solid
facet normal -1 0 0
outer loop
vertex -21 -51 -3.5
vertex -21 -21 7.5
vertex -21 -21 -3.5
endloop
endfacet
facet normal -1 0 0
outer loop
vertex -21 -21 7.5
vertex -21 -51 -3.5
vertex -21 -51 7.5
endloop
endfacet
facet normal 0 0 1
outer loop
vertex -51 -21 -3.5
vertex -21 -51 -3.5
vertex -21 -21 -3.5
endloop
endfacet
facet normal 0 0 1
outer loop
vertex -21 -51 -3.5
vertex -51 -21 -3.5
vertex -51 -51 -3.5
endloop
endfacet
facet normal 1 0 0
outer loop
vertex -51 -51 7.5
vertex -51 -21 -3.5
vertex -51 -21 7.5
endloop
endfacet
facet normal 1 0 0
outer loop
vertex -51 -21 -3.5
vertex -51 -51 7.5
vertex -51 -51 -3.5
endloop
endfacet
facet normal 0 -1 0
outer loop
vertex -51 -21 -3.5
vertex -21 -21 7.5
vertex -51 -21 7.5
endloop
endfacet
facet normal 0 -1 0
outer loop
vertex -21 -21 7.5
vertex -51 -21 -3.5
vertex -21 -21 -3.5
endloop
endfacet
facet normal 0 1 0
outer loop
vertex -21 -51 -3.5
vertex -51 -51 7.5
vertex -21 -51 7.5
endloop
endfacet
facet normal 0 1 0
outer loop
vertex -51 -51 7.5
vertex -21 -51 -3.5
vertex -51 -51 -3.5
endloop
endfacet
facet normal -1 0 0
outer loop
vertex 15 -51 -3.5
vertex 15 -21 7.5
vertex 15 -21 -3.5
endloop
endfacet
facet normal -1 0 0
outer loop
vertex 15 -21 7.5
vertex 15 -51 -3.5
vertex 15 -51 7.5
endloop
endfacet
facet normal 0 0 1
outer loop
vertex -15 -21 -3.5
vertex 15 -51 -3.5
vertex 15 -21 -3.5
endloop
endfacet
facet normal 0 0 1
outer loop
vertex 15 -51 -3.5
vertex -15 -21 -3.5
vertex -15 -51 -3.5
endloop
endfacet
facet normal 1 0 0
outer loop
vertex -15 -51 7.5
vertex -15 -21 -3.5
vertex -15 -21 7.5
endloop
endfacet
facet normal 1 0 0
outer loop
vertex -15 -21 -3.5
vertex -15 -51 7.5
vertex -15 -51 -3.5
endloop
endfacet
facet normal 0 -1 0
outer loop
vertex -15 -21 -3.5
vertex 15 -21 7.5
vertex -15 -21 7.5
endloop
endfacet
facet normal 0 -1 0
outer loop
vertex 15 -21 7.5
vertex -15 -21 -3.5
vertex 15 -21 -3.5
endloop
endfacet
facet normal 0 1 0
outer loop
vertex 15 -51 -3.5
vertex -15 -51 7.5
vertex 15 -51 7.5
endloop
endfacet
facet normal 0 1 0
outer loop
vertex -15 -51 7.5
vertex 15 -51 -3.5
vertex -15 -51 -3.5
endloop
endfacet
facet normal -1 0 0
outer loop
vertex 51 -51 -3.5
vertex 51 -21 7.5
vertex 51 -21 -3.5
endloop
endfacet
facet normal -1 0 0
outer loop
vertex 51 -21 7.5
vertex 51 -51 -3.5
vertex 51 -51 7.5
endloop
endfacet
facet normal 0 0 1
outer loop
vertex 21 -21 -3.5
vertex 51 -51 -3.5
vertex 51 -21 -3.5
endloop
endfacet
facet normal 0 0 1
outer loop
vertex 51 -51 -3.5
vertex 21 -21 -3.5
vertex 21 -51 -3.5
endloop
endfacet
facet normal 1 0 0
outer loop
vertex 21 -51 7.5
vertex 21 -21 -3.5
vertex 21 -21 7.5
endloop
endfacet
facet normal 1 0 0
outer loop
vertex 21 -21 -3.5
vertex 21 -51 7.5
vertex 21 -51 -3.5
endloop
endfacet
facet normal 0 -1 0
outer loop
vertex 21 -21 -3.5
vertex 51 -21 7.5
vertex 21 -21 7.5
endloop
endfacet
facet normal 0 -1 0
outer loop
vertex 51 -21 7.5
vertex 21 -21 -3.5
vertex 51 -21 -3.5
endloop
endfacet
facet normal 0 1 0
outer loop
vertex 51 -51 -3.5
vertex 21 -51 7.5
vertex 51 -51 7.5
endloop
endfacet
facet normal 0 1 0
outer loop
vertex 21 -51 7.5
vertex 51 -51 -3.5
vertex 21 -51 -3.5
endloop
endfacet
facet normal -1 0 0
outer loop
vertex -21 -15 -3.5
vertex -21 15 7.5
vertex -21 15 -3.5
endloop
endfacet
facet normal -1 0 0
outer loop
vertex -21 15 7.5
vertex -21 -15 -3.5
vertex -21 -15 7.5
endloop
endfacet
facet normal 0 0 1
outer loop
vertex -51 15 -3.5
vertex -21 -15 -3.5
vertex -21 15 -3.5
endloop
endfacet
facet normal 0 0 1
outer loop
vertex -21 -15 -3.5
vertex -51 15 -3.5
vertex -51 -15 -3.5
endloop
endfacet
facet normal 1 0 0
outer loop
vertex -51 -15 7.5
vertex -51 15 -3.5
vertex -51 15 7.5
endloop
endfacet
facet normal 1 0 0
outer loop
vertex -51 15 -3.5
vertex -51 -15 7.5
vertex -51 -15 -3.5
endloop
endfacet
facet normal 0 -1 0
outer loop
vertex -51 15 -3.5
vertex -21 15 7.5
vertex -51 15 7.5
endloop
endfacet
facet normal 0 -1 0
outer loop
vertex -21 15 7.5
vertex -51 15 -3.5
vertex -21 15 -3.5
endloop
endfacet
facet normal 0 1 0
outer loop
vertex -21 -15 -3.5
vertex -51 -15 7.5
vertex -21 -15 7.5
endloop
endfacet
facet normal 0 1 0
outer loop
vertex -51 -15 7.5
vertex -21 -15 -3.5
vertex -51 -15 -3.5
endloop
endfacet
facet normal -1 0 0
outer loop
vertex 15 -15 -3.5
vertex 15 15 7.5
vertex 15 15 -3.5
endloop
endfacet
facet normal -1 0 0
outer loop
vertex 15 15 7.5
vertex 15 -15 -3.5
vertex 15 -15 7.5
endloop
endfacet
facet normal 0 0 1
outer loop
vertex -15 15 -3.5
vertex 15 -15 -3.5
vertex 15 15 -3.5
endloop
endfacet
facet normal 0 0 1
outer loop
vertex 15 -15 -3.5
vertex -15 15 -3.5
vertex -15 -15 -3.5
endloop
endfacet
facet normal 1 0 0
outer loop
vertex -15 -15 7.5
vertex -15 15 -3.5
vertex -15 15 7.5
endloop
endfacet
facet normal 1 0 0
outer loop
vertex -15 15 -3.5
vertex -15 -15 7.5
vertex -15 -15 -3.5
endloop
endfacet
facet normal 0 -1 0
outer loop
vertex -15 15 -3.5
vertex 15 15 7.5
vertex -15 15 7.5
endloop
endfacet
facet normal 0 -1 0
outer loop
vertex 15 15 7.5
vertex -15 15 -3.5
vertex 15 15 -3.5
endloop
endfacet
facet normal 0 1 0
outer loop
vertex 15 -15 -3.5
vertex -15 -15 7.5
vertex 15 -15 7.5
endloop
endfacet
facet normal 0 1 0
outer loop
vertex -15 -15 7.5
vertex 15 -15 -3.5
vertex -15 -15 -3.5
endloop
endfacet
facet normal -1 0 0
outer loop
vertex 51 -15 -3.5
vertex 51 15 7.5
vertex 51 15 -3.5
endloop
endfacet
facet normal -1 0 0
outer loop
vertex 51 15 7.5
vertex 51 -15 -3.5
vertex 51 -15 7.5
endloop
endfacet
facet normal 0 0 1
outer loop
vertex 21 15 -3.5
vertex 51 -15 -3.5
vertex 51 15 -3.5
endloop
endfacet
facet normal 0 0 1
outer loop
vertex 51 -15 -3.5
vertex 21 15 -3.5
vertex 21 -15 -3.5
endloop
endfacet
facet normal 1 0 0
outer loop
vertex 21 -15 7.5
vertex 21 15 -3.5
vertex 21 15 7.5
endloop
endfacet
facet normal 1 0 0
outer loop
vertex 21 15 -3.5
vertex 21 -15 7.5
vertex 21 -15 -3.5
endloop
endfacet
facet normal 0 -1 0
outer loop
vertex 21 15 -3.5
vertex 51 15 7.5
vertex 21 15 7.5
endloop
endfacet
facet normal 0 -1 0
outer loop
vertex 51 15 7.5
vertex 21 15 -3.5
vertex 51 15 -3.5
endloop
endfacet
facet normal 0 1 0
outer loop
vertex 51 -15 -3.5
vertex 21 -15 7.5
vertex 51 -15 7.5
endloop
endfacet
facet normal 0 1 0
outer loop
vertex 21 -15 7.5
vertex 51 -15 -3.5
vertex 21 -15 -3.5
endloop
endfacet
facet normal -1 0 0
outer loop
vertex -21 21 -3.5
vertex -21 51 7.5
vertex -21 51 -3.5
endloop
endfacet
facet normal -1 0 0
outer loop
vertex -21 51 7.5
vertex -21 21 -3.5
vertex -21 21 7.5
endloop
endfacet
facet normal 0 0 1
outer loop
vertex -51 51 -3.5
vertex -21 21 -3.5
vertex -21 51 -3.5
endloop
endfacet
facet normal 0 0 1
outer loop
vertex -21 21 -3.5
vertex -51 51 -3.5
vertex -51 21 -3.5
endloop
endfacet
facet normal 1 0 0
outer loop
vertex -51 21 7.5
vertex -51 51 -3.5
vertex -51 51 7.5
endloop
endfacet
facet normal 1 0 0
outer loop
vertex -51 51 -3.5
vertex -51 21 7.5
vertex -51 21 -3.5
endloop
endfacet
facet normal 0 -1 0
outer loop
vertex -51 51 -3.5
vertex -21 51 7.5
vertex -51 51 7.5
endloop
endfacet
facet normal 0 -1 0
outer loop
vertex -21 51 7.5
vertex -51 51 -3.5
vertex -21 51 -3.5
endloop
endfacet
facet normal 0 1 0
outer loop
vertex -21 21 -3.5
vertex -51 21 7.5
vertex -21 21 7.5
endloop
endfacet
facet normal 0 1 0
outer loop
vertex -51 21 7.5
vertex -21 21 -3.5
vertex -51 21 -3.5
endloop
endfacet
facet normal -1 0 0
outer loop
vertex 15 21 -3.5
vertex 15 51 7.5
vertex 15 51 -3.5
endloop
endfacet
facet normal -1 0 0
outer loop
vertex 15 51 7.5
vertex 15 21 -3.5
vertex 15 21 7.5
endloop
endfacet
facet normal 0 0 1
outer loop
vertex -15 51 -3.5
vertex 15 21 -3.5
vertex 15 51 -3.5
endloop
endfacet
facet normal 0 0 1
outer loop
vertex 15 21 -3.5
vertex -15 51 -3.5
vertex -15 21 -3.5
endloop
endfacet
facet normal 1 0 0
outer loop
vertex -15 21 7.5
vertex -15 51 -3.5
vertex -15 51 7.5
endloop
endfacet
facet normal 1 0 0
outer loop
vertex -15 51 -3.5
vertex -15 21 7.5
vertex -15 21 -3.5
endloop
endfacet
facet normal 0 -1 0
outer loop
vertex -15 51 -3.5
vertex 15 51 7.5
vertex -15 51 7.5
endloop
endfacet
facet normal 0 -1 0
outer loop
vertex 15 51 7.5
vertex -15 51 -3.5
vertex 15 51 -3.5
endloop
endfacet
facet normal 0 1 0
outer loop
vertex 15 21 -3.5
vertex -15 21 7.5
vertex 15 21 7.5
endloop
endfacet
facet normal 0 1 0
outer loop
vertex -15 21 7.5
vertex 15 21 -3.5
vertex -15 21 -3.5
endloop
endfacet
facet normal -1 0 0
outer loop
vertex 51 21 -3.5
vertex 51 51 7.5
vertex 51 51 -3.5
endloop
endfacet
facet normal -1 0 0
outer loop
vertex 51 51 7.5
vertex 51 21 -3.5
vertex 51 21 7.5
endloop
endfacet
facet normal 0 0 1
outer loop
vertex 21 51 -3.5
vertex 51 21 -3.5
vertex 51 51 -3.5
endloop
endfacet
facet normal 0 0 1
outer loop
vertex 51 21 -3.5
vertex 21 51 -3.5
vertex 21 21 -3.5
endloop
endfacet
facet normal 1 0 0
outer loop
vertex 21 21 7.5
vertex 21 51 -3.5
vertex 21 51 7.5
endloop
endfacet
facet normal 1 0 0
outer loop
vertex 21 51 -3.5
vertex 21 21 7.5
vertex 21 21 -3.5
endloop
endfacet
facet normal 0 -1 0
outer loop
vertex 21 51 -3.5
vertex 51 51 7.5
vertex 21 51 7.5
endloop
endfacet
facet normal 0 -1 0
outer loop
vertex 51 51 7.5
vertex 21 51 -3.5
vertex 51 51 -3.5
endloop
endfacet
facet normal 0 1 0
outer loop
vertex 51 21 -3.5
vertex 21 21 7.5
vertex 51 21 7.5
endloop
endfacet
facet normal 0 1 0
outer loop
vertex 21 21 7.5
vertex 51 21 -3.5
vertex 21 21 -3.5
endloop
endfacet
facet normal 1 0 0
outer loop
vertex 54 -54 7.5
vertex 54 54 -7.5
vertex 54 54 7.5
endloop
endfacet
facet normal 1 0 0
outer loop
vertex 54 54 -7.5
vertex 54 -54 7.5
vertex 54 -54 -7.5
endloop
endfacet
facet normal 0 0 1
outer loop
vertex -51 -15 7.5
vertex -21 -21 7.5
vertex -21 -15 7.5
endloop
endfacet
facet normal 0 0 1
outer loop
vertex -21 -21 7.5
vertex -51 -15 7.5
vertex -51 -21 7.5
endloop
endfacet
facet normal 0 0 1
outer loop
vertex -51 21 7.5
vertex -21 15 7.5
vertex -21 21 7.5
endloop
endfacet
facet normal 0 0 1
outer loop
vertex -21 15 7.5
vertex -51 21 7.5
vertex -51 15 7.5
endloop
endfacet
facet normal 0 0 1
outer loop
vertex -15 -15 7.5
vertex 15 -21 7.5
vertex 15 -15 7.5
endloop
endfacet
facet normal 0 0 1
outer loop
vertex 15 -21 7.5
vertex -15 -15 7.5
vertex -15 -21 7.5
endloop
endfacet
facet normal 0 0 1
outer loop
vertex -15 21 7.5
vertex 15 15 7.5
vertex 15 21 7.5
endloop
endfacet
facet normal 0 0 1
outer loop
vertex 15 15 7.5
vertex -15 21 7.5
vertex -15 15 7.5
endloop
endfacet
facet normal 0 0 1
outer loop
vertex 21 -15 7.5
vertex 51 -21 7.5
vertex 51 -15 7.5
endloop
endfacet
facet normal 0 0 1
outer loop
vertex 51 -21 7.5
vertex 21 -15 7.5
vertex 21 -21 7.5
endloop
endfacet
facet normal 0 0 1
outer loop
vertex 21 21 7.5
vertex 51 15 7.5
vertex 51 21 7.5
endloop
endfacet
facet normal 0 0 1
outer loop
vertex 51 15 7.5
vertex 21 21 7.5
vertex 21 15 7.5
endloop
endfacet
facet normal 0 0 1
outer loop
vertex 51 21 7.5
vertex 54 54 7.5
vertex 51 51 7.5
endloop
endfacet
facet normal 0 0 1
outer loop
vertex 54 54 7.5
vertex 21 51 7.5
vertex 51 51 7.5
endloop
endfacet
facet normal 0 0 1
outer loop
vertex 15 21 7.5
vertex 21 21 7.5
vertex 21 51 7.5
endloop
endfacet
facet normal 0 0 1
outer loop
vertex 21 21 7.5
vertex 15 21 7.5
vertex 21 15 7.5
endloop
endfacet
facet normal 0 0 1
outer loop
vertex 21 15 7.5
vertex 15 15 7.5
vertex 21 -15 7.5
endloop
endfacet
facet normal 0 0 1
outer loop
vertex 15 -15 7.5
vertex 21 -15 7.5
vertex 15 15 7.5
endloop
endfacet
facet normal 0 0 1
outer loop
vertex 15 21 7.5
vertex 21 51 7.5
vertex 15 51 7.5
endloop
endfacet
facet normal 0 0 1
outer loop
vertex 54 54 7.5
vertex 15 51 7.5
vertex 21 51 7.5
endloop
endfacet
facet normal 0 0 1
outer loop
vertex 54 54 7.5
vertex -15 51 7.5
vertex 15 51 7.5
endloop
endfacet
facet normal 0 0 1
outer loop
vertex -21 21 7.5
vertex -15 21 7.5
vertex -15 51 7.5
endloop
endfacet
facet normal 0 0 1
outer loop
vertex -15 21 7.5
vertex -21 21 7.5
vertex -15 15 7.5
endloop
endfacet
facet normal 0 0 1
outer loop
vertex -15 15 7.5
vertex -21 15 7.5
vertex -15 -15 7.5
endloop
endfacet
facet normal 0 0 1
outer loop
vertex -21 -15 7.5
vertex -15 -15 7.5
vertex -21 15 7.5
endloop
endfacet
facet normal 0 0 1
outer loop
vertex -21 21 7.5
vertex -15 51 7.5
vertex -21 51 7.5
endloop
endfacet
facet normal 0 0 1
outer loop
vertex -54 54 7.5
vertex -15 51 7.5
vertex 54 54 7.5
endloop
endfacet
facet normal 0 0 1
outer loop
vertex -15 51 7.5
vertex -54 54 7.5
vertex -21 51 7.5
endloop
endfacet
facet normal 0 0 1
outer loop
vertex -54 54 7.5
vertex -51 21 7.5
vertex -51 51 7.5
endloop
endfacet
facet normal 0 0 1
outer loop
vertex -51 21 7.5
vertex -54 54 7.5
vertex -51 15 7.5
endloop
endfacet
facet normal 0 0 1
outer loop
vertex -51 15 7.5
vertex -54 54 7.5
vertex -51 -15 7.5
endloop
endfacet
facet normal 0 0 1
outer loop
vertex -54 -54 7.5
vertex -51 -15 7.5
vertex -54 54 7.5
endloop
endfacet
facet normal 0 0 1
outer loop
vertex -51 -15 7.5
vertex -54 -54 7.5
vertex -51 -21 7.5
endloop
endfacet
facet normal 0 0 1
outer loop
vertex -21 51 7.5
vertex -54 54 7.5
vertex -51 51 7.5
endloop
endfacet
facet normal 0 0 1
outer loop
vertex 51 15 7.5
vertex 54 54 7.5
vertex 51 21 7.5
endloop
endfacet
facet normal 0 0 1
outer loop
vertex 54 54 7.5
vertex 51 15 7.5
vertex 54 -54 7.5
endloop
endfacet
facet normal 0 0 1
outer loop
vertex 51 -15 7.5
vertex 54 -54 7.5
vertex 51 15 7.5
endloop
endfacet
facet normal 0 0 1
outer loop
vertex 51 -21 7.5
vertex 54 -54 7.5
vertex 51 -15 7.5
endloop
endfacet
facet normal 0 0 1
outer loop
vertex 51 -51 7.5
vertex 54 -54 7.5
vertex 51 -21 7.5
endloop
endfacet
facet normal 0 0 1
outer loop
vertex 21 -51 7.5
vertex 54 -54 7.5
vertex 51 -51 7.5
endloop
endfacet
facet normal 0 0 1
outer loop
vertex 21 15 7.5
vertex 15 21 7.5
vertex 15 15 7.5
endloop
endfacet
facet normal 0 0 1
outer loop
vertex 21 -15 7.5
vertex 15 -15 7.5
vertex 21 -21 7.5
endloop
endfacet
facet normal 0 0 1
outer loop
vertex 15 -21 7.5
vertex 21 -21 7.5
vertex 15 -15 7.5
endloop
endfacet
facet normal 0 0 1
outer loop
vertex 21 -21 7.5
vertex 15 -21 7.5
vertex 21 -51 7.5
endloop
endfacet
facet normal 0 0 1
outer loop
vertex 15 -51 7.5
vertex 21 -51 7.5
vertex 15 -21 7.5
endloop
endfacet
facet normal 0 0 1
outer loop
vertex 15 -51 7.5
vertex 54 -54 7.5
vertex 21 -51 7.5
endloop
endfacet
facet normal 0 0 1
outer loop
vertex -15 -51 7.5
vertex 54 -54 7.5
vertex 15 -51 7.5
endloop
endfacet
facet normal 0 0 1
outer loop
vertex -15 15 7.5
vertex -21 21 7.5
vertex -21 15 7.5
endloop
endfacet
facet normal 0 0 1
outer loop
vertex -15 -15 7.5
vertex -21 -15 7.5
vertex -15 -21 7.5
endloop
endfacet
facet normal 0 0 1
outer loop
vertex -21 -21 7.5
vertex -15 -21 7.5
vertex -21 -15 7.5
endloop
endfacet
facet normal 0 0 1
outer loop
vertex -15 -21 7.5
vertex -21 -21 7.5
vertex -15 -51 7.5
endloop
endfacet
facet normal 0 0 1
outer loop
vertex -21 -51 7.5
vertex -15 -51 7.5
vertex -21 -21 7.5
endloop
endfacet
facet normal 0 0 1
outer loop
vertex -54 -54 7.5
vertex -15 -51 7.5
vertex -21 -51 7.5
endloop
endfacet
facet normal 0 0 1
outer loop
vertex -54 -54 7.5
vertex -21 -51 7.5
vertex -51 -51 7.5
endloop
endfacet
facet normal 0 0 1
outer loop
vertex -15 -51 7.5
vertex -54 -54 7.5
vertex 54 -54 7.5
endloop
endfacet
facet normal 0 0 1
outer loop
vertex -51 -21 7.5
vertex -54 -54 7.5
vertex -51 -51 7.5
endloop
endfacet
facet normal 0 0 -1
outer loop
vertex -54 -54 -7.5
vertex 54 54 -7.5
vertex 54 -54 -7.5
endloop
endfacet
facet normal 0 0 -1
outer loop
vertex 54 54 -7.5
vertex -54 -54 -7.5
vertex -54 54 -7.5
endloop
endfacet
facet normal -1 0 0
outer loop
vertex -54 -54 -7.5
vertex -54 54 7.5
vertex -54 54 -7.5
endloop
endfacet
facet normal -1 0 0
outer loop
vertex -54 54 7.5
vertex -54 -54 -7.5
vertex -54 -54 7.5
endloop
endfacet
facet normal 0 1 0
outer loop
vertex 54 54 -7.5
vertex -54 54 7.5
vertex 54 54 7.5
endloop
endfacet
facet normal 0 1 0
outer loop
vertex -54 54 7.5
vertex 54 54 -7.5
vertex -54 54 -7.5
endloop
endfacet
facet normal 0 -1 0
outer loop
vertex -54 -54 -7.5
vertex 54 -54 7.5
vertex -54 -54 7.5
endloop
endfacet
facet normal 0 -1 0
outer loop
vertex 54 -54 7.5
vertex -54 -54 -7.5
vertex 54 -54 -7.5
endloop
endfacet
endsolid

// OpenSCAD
$fn = 32;

// ----------------------------------------------------------------------
// Pocket plate 108 x 108 x 15
// 3 x 3 pockets 30 mm square, 11 mm deep
// ----------------------------------------------------------------------

// --- parameters (mm) ---
thickness = 15;  // plate thickness
floor_t = 4;     // material left under each pocket
pocket = 30;     // pocket side length
pitch_x = 36;    // pocket pitch along X
pitch_y = 36;    // pocket pitch along Y
cols = 3;        // pockets per row
rows = 3;        // rows of pockets

// --- derived feature positions (mm) ---
depth = thickness - floor_t;        // = 11   pocket depth, down to the floor
span_x = (cols - 1) * pitch_x;      // = 72   distance between outer pockets
span_y = (rows - 1) * pitch_y;      // = 72   distance between outer pocket rows
origin_x = -span_x / 2;             // = -36   X of the first pocket
origin_y = -span_y / 2;             // = -36   Y of the first pocket
plate = [span_x + pocket + 6, span_y + pocket + 6, thickness];  // = [108, 108, 15]   overall size: pockets plus 3 mm of wall on each side
feature_centers = [
  [origin_x + 0 * pitch_x, origin_y + 0 * pitch_y],
  [origin_x + 1 * pitch_x, origin_y + 0 * pitch_y],
  [origin_x + 2 * pitch_x, origin_y + 0 * pitch_y],
  [origin_x + 0 * pitch_x, origin_y + 1 * pitch_y],
  [origin_x + 1 * pitch_x, origin_y + 1 * pitch_y],
  [origin_x + 2 * pitch_x, origin_y + 1 * pitch_y],
  [origin_x + 0 * pitch_x, origin_y + 2 * pitch_y],
  [origin_x + 1 * pitch_x, origin_y + 2 * pitch_y],
  [origin_x + 2 * pitch_x, origin_y + 2 * pitch_y]
];   // pocket centres, used verbatim by the cutter loop

// plate outline, then one pocket per centre in feature_centers
difference() {
  cube(plate, center = true);
  for (centre = feature_centers)
    translate([centre[0] - pocket / 2, centre[1] - pocket / 2, plate[2] / 2 - depth])
      cube([pocket, pocket, depth + 1]);  // centred on the declared pocket centre
}
